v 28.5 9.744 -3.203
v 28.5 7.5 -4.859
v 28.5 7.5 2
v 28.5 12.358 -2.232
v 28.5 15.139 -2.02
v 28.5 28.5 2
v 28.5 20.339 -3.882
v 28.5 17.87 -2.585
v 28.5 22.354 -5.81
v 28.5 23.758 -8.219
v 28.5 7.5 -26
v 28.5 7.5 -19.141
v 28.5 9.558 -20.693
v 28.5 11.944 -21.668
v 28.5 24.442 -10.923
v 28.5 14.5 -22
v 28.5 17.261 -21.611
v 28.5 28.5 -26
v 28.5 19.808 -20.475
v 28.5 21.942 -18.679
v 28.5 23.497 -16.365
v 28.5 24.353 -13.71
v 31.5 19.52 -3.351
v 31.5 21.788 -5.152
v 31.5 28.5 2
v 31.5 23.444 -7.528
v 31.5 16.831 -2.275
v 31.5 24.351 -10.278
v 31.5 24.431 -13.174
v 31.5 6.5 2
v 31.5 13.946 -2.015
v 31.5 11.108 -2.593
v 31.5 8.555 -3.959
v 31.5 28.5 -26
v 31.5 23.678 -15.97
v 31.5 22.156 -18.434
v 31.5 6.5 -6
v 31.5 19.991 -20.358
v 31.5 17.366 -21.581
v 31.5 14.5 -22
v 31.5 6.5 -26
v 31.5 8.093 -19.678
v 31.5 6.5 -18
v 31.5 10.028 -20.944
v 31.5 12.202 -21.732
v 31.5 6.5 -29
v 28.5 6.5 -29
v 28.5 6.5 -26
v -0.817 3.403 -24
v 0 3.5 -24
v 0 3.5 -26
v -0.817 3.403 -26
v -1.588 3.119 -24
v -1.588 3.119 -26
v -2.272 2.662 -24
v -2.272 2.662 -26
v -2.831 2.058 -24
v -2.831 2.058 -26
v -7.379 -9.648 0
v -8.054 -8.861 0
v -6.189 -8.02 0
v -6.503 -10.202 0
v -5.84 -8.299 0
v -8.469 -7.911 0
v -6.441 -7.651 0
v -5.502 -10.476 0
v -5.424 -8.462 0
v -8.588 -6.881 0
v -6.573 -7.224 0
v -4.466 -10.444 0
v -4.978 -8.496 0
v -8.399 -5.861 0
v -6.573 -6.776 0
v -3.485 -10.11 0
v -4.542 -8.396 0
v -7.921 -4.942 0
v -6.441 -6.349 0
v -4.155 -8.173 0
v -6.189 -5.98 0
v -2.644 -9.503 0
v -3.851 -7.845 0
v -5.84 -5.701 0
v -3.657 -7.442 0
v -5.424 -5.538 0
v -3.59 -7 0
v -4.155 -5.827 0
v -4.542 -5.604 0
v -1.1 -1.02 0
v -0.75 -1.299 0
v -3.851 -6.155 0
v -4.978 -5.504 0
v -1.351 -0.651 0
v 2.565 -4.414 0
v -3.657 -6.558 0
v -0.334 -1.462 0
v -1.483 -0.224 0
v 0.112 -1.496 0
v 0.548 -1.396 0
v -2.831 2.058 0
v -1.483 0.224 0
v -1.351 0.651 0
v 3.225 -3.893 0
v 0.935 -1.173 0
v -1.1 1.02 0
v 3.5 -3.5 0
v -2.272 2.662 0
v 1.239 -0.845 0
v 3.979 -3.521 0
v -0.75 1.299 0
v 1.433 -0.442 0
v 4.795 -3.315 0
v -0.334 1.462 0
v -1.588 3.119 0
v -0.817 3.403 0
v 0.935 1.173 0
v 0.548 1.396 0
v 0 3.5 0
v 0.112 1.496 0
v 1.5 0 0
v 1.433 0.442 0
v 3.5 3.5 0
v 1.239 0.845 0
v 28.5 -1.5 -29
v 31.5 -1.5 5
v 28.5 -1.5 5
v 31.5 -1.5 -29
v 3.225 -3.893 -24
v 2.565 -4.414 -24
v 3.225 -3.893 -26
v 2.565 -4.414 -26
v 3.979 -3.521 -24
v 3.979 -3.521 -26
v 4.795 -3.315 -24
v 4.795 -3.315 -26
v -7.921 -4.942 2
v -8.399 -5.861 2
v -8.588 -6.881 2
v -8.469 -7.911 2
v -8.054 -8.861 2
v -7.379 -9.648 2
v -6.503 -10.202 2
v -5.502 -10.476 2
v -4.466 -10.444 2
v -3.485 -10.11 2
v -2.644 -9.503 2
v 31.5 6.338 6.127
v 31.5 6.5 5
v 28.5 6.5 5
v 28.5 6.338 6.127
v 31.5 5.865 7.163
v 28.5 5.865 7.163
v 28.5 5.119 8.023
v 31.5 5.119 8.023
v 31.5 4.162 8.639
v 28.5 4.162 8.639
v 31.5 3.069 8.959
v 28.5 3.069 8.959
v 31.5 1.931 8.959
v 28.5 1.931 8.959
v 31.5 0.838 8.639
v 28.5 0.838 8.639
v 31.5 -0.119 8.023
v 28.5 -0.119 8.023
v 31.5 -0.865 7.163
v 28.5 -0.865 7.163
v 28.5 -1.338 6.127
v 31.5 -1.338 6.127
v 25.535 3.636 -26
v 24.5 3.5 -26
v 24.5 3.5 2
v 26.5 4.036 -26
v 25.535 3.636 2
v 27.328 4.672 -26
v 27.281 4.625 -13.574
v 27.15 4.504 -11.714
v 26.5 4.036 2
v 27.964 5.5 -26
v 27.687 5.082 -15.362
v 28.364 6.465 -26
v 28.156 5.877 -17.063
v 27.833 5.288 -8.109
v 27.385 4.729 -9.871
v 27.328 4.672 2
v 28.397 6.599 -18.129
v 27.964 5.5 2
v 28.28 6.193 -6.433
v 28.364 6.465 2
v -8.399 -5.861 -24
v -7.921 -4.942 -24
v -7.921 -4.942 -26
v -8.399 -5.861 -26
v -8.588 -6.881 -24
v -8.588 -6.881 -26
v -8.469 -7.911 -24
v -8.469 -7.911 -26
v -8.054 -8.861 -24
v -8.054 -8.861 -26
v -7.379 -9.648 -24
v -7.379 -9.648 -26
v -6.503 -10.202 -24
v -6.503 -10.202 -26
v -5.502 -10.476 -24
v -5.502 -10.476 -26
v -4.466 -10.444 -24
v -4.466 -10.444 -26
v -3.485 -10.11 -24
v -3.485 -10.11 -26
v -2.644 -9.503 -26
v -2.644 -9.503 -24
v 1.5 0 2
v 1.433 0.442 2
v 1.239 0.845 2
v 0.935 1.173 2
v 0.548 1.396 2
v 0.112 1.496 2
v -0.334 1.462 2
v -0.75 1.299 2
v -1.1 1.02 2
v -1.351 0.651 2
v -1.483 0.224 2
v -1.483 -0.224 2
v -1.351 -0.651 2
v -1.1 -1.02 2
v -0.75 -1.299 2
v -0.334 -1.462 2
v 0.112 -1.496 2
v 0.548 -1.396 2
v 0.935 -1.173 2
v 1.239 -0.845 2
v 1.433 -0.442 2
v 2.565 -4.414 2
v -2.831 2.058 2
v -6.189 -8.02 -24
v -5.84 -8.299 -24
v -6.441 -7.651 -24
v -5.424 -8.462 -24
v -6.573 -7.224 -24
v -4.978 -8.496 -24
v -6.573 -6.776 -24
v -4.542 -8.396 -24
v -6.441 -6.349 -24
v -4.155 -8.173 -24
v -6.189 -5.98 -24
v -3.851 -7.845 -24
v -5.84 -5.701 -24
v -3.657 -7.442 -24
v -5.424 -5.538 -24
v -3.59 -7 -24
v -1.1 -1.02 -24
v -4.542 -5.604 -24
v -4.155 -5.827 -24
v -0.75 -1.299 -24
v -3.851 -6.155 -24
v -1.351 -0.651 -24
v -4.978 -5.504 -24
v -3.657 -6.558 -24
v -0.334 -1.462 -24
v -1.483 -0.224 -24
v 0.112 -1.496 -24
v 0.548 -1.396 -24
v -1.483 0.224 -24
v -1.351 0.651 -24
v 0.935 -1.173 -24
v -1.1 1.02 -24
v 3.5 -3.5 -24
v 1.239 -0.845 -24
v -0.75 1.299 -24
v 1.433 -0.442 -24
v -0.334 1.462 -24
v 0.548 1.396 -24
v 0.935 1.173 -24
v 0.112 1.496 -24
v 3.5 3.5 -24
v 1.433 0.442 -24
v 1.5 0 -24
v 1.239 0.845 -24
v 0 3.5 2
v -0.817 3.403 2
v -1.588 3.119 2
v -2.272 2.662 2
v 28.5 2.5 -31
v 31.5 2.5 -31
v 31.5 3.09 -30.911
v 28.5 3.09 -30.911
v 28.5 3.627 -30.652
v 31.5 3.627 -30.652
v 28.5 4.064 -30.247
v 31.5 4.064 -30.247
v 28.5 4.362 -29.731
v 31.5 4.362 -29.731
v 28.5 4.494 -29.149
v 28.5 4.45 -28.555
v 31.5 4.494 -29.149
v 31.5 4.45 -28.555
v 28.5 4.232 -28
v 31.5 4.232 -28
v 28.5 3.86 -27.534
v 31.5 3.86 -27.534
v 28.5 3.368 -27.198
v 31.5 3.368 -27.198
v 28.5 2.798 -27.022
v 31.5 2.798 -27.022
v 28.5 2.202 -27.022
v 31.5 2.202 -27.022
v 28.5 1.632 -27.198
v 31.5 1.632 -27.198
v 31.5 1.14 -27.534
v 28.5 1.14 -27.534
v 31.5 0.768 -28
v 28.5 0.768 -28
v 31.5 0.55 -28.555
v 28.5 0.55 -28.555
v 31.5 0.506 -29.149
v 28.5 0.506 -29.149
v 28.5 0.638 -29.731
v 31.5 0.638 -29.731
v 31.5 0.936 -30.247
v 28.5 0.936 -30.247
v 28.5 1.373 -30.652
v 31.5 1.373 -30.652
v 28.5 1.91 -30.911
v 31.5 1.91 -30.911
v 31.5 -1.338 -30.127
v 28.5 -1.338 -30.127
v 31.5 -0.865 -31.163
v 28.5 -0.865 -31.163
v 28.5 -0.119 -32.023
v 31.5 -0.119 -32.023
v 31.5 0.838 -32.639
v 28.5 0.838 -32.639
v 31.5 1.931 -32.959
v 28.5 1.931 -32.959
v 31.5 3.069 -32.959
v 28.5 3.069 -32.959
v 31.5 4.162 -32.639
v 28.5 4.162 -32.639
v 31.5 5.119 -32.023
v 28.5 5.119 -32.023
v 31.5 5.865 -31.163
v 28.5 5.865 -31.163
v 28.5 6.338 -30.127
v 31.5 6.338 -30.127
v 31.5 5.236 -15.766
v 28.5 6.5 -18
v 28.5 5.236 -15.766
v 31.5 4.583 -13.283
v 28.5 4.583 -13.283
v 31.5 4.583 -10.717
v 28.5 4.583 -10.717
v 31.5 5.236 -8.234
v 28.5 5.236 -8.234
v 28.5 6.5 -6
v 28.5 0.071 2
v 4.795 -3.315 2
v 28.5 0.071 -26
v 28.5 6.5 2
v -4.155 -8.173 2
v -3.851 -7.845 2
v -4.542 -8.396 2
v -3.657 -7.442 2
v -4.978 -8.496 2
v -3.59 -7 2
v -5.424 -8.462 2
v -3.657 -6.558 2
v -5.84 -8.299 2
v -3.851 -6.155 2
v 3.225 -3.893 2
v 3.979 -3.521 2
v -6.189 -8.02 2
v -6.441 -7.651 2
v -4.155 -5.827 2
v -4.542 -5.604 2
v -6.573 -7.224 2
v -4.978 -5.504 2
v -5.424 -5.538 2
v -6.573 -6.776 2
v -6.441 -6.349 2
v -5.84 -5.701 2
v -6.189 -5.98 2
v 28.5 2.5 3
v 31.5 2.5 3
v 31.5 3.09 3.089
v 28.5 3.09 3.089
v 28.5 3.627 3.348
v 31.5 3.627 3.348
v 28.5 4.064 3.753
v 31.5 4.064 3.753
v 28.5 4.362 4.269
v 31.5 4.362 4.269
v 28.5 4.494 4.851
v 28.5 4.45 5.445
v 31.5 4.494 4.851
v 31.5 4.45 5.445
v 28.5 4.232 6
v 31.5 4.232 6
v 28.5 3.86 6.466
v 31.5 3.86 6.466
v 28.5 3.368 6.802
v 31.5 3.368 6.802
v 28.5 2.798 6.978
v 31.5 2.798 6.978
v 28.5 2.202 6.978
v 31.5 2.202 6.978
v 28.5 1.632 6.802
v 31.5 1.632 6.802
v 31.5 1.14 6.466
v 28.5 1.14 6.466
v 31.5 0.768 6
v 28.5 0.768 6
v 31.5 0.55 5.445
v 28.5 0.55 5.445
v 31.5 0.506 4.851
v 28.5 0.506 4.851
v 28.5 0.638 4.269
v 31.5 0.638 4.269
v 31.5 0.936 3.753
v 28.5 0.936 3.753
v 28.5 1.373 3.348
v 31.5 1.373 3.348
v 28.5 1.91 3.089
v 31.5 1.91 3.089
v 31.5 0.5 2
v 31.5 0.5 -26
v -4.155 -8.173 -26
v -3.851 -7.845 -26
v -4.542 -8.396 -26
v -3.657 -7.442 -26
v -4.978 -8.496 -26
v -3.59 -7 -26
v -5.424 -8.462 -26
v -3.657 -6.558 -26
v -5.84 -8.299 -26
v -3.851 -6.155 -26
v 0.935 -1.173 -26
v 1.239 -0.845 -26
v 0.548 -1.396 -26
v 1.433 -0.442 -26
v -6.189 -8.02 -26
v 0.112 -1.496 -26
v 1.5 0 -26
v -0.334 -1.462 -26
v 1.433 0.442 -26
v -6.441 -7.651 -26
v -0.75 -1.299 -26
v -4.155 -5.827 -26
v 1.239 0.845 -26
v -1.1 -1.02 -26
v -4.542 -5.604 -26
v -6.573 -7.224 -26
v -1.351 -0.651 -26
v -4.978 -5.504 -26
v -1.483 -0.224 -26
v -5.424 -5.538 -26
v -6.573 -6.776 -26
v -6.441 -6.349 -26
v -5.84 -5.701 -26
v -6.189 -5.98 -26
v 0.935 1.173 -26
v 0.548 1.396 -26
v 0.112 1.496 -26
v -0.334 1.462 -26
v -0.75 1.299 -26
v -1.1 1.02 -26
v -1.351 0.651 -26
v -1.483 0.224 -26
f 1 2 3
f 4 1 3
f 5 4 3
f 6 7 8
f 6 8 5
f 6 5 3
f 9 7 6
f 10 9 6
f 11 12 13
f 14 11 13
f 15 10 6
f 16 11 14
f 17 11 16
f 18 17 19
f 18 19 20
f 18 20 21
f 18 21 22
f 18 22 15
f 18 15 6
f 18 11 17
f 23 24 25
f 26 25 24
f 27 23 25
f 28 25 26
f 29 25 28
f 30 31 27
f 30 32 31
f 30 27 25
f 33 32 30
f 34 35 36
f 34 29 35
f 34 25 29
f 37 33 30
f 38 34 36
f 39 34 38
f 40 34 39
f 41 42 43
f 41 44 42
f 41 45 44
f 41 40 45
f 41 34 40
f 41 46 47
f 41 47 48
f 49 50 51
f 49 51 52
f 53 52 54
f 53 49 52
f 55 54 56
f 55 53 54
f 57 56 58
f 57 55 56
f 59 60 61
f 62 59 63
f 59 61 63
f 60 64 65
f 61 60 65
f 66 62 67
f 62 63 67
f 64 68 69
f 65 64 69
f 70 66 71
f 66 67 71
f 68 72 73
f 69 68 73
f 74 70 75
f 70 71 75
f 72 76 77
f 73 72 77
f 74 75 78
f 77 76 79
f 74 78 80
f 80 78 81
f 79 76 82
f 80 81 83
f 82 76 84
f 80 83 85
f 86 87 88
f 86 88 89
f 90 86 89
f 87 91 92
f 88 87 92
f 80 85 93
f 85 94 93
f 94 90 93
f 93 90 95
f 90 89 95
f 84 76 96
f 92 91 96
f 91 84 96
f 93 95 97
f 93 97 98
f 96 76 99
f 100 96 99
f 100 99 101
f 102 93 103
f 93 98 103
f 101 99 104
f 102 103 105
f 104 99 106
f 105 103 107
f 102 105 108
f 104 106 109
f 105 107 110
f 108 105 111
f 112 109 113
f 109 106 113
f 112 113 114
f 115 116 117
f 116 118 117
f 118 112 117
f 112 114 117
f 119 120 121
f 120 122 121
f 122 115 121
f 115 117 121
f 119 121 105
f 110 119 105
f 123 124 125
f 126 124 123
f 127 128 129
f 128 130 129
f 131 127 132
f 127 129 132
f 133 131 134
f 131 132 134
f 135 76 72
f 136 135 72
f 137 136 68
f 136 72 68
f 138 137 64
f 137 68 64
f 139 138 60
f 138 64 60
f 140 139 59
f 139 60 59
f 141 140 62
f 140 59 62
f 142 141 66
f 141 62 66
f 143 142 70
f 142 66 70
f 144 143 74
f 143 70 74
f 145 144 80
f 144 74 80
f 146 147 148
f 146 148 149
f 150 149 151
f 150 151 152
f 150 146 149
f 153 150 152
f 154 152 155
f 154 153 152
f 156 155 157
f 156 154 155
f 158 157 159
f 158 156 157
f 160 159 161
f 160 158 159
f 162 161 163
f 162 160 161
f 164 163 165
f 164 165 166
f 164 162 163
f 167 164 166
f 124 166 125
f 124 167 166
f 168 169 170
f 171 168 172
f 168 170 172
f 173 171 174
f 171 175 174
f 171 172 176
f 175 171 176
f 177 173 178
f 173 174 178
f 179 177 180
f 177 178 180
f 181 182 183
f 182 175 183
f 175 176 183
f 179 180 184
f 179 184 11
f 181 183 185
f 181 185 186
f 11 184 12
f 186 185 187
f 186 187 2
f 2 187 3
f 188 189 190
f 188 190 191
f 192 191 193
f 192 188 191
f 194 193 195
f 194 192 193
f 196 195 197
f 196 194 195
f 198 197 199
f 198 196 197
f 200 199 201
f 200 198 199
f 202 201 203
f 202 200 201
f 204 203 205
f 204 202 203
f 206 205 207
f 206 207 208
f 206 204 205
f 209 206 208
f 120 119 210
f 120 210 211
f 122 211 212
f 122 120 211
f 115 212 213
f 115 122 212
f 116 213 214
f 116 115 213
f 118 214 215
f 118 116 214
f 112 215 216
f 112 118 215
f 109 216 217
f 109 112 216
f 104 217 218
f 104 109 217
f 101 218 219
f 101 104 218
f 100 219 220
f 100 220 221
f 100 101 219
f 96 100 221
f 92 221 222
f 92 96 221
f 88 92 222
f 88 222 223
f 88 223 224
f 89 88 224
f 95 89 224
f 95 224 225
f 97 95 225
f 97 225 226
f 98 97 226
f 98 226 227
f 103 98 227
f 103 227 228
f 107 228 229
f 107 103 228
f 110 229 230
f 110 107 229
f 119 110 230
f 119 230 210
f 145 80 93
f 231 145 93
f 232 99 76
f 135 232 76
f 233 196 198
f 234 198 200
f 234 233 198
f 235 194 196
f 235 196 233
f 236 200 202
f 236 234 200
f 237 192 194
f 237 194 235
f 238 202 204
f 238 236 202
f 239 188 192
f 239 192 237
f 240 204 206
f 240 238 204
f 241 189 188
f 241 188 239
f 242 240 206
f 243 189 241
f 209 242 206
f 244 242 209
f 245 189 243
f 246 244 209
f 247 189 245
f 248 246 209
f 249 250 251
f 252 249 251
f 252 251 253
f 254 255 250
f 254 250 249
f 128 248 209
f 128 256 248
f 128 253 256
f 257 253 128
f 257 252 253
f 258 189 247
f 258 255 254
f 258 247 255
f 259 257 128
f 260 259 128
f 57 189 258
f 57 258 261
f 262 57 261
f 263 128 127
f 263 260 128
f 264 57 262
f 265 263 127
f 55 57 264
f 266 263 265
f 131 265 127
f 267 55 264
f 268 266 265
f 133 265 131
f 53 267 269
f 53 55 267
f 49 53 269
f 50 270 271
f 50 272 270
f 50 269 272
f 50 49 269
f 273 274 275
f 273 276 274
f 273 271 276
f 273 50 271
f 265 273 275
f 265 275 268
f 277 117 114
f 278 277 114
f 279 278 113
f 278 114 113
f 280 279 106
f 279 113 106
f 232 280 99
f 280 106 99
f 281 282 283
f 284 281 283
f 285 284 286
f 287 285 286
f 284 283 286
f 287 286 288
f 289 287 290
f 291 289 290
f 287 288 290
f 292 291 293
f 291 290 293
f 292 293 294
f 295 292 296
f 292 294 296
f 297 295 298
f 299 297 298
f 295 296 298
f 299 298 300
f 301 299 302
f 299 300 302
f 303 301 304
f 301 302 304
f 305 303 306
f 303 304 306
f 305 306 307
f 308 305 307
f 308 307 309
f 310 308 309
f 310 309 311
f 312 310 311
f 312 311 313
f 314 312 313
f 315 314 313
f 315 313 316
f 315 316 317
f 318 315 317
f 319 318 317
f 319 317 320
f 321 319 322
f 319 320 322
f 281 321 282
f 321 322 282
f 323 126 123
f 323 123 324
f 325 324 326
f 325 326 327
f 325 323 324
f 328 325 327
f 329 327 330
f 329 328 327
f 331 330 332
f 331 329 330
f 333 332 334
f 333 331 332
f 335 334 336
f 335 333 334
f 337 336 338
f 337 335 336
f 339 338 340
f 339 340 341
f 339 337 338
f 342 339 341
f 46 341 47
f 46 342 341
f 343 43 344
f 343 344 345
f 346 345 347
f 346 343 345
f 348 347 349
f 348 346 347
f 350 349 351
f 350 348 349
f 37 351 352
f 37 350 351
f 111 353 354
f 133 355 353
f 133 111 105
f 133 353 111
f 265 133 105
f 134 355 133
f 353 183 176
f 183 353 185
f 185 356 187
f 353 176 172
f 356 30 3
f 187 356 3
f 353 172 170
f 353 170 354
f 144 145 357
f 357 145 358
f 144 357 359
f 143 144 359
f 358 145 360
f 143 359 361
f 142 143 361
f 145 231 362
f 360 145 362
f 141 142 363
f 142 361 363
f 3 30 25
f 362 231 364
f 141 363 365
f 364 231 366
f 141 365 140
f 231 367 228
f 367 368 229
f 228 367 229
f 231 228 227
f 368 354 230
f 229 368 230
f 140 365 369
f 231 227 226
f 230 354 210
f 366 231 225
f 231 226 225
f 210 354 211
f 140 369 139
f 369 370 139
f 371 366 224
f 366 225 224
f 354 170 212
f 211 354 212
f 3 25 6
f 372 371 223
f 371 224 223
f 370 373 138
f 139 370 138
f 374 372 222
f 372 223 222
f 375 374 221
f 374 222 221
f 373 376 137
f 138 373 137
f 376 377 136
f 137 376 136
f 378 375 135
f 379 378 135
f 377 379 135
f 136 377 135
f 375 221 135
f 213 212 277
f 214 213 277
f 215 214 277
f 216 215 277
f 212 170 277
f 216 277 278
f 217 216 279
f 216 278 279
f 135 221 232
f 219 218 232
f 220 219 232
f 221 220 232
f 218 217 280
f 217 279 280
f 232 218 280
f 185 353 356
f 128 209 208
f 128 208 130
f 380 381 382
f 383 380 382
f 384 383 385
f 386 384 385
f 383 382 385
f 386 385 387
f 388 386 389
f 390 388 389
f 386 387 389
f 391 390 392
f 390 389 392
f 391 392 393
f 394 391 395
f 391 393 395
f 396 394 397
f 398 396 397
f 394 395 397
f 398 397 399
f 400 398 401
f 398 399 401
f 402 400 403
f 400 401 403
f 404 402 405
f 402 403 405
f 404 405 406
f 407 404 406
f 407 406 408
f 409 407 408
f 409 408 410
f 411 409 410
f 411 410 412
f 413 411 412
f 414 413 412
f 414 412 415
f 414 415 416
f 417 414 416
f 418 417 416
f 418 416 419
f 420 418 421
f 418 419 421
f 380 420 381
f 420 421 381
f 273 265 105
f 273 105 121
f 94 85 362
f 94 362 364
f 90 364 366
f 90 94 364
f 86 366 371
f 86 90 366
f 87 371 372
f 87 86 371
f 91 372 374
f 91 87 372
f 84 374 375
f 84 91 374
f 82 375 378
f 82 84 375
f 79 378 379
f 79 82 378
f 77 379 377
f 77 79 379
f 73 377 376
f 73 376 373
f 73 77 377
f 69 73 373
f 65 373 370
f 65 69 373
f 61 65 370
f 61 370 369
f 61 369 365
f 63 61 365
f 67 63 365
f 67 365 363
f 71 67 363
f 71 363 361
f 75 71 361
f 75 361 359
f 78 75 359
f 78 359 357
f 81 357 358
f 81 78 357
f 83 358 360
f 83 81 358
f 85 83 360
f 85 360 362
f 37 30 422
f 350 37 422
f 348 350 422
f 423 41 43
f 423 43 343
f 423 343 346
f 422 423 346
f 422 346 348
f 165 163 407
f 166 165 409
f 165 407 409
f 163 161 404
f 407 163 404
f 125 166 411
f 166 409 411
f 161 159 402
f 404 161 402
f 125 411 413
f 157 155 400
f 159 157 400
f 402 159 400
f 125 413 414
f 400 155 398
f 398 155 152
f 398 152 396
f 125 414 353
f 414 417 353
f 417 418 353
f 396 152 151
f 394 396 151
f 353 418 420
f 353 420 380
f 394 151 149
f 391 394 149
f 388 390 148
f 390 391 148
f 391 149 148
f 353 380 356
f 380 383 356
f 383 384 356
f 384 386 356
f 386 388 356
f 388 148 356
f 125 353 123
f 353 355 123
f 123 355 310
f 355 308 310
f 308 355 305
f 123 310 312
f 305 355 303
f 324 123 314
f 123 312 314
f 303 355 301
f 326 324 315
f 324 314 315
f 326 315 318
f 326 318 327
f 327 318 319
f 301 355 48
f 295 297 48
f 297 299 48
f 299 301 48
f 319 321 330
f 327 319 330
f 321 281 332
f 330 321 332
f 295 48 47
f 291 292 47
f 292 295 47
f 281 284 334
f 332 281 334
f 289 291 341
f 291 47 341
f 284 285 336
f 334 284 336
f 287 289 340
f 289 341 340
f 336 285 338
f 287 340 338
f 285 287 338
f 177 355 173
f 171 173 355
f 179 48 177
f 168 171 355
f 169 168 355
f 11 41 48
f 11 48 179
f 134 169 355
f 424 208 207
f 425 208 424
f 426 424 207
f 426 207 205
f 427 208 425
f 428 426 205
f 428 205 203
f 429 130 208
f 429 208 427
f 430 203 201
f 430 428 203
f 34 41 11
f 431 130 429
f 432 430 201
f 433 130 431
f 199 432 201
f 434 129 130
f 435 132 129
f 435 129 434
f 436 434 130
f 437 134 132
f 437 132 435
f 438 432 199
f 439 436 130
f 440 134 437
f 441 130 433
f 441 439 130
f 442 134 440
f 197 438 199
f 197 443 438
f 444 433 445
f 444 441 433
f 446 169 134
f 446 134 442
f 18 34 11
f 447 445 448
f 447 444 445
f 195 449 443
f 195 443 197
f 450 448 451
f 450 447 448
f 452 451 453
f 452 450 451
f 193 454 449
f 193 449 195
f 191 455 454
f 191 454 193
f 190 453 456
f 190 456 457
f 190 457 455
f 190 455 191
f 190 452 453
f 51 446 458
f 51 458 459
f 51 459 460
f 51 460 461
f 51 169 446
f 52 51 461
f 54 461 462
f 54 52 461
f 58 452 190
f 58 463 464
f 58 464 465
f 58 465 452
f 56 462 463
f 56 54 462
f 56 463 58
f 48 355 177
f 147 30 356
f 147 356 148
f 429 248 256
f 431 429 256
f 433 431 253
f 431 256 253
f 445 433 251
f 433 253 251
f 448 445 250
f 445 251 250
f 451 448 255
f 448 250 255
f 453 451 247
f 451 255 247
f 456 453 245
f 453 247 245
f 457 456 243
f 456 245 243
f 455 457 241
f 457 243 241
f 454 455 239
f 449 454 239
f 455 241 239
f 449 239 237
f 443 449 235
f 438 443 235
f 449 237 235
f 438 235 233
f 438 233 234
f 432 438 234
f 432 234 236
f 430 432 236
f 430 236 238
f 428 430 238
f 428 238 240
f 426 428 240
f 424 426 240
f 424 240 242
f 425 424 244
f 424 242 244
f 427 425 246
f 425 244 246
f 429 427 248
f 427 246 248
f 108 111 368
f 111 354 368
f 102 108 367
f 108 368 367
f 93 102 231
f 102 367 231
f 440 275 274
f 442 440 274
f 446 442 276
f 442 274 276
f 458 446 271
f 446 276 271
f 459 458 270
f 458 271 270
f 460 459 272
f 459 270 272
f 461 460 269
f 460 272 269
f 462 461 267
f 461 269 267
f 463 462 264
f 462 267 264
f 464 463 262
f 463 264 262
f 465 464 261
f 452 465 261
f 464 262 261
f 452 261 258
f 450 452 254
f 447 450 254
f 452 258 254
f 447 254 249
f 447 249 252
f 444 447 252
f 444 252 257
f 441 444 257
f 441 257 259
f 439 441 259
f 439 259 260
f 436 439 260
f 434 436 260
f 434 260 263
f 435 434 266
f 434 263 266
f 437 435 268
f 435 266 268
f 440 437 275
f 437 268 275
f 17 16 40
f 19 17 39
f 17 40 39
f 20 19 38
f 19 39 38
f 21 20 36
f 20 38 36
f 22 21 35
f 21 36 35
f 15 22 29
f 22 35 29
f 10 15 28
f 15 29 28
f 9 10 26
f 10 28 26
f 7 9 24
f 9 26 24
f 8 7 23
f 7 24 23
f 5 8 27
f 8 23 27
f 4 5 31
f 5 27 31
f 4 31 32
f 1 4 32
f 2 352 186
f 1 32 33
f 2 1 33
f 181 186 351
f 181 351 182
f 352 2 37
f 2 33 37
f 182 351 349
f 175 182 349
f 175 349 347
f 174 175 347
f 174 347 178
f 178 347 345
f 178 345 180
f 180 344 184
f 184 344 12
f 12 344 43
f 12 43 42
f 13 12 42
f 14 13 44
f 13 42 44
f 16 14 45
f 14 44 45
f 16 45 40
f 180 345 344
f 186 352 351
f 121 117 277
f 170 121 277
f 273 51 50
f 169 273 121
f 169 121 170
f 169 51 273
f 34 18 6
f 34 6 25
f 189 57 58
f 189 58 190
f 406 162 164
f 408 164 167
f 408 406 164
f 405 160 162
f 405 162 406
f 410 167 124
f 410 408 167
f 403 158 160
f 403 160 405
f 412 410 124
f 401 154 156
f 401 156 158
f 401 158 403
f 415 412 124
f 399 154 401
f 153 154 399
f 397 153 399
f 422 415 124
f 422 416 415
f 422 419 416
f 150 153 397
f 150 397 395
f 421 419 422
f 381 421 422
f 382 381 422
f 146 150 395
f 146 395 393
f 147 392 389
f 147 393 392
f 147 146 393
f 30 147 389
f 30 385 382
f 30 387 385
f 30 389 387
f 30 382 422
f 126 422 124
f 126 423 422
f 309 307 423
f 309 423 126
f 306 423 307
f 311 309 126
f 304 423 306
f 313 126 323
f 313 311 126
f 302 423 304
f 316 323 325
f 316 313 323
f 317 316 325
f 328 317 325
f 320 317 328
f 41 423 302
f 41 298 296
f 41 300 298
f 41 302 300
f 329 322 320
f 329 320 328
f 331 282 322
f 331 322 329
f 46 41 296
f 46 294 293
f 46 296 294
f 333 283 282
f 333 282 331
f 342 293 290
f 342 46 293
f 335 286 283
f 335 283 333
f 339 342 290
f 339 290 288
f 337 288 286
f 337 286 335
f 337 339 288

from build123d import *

# Parameters (mm, degrees)
SKETCH2_R           = 3.5
SKETCH2_R_2         = 1.5
BOSS_EXTRUDE1_DEPTH = 2
BOSS_EXTRUDE2_START = -2
BOSS_EXTRUDE2_DEPTH = 2
BOSS_EXTRUDE3_START = -2
SKETCH4_R           = 1.5
BOSS_EXTRUDE3_DEPTH = 2
BOSS_EXTRUDE4_START = -26
SKETCH4_2_R         = 1.5
BOSS_EXTRUDE4_DEPTH = 2
BOSS_EXTRUDE5_START = -28
BOSS_EXTRUDE5_DEPTH = 28
FILLET1_R           = 4
CUT_EXTRUDE1_REACH  = 57.637
SKETCH6_R           = 10
SKETCH7_R           = 2
BOSS_EXTRUDE6_DEPTH = 3


with BuildPart() as part:
    # Sketch2 → Boss-Extrude1 (new body)
    with BuildSketch(Plane.XY):
        Circle(SKETCH2_R)
        Circle(SKETCH2_R_2, mode=Mode.SUBTRACT)
    extrude(amount=BOSS_EXTRUDE1_DEPTH)

    # Sketch3 → Boss-Extrude2 (add)
    with BuildSketch(Plane.XY.offset(2).offset(BOSS_EXTRUDE2_START)):
        with BuildLine():
            Line((3.5, 3.5), (0, 3.5))
            ThreePointArc((0, 3.5), (2.474873734, 2.474873734), (3.5, 0))
            Line((3.5, 0), (3.5, 3.5))
        make_face()
        with BuildLine():
            Line((3.5, -3.5), (3.5, 0))
            ThreePointArc((3.5, 0), (2.474873734, -2.474873734), (0, -3.5))
            Line((0, -3.5), (3.5, -3.5))
        make_face()
    extrude(amount=BOSS_EXTRUDE2_DEPTH)

    # Sketch4 → Boss-Extrude3 (add)
    with BuildSketch(Plane.XY.offset(2).offset(BOSS_EXTRUDE3_START)):
        with BuildLine():
            Line((-2.830776268, 2.058325952), (-7.920645724, -4.941674048))
            ThreePointArc((-7.920645724, -4.941674048), (-7.37878936, -9.647800157), (-2.64377537, -9.503322537))
            Line((-2.64377537, -9.503322537), (3.5, -3.5))
            Line((3.5, -3.5), (3.5, 3.5))
            Line((3.5, 3.5), (0, 3.5))
            ThreePointArc((0, 3.5), (-1.588373251, 3.118825166), (-2.830776268, 2.058325952))
        make_face()
        with Locations((-5.089869456, -7)):
            Circle(SKETCH4_R, mode=Mode.SUBTRACT)
        Circle(SKETCH4_R, mode=Mode.SUBTRACT)
    extrude(amount=BOSS_EXTRUDE3_DEPTH)



with BuildPart() as body_2:
    # Sketch4<2> → Boss-Extrude4 (new body)
    with BuildSketch(Plane.XY.offset(2).offset(BOSS_EXTRUDE4_START)):
        with BuildLine():
            Line((-2.830776268, 2.058325952), (-7.920645724, -4.941674048))
            ThreePointArc((-7.920645724, -4.941674048), (-7.37878936, -9.647800157), (-2.64377537, -9.503322537))
            Line((-2.64377537, -9.503322537), (3.5, -3.5))
            Line((3.5, -3.5), (3.5, 3.5))
            Line((3.5, 3.5), (0, 3.5))
            ThreePointArc((0, 3.5), (-1.588373251, 3.118825166), (-2.830776268, 2.058325952))
        make_face()
        with Locations((-5.089869456, -7)):
            Circle(SKETCH4_2_R, mode=Mode.SUBTRACT)
        Circle(SKETCH4_2_R, mode=Mode.SUBTRACT)
    extrude(amount=-BOSS_EXTRUDE4_DEPTH)


with BuildPart() as part_1:
    add(part.part)

    add(body_2.part)  # Boss-Extrude5 merges body 2
    # Sketch5 → Boss-Extrude5 (add)
    with BuildSketch(Plane.XY.offset(2).offset(BOSS_EXTRUDE5_START)):
        Polygon((3.5, 3.5), (28.5, 3.5), (28.5, 28.5), (31.5, 28.5), (31.5, 0.5), (3.5, -3.5), align=None)
    extrude(amount=BOSS_EXTRUDE5_DEPTH)

    # Fillet1
    fillet1_edges = [part_1.edges().sort_by_distance(p)[0] for p in [
        (3.5, -3.5, 1),
        (3.5, -3.5, -25),
        (28.5, 3.5, -12),
    ]]
    fillet(fillet1_edges, radius=FILLET1_R)

    # Sketch6 → Cut-Extrude1 (cut, up to next)
    with BuildSketch(Plane(origin=(31.5, 0, 0), x_dir=(0, 0, -1), z_dir=(1, 0, 0)), mode=Mode.PRIVATE) as cut_extrude1_sk1:
        with Locations((12, 14.5)):
            Circle(SKETCH6_R)
    cut_extrude1_tool1 = extrude(cut_extrude1_sk1.sketch, amount=-CUT_EXTRUDE1_REACH, mode=Mode.PRIVATE) & part_1.part
    add(cut_extrude1_tool1.solids().sort_by_distance((31.5, 14.5, -12))[0], mode=Mode.SUBTRACT)

    # Sketch7 → Boss-Extrude6 (add)
    # profile 1 of 2: a face of its own
    with BuildSketch(Plane(origin=(31.5, 0, 0), x_dir=(0, 0, -1), z_dir=(1, 0, 0))):
        with BuildLine():
            Line((6, 6.5), (-2, 6.5))
            Line((-2, 6.5), (-2, 0.5))
            Line((-2, 0.5), (26, 0.5))
            Line((26, 0.5), (26, 6.5))
            Line((26, 6.5), (18, 6.5))
            ThreePointArc((18, 6.5), (12, 4.5), (6, 6.5))
        make_face()
    # profile 2 of 2: a face of its own
    with BuildSketch(Plane(origin=(31.5, 0, 0), x_dir=(0, 0, -1), z_dir=(1, 0, 0))):
        with BuildLine():
            Line((-2, 6.5), (-5, 6.5))
            ThreePointArc((-5, 6.5), (-9, 2.5), (-5, -1.5))
            Line((-5, -1.5), (29, -1.5))
            ThreePointArc((29, -1.5), (33, 2.5), (29, 6.5))
            Line((29, 6.5), (26, 6.5))
            Line((26, 6.5), (26, 0.5))
            Line((26, 0.5), (-2, 0.5))
            Line((-2, 0.5), (-2, 6.5))
        make_face()
        with Locations((-5, 2.5)):
            Circle(SKETCH7_R, mode=Mode.SUBTRACT)
        with Locations((29, 2.5)):
            Circle(SKETCH7_R, mode=Mode.SUBTRACT)
    extrude(amount=-BOSS_EXTRUDE6_DEPTH)


solid = part_1.part
